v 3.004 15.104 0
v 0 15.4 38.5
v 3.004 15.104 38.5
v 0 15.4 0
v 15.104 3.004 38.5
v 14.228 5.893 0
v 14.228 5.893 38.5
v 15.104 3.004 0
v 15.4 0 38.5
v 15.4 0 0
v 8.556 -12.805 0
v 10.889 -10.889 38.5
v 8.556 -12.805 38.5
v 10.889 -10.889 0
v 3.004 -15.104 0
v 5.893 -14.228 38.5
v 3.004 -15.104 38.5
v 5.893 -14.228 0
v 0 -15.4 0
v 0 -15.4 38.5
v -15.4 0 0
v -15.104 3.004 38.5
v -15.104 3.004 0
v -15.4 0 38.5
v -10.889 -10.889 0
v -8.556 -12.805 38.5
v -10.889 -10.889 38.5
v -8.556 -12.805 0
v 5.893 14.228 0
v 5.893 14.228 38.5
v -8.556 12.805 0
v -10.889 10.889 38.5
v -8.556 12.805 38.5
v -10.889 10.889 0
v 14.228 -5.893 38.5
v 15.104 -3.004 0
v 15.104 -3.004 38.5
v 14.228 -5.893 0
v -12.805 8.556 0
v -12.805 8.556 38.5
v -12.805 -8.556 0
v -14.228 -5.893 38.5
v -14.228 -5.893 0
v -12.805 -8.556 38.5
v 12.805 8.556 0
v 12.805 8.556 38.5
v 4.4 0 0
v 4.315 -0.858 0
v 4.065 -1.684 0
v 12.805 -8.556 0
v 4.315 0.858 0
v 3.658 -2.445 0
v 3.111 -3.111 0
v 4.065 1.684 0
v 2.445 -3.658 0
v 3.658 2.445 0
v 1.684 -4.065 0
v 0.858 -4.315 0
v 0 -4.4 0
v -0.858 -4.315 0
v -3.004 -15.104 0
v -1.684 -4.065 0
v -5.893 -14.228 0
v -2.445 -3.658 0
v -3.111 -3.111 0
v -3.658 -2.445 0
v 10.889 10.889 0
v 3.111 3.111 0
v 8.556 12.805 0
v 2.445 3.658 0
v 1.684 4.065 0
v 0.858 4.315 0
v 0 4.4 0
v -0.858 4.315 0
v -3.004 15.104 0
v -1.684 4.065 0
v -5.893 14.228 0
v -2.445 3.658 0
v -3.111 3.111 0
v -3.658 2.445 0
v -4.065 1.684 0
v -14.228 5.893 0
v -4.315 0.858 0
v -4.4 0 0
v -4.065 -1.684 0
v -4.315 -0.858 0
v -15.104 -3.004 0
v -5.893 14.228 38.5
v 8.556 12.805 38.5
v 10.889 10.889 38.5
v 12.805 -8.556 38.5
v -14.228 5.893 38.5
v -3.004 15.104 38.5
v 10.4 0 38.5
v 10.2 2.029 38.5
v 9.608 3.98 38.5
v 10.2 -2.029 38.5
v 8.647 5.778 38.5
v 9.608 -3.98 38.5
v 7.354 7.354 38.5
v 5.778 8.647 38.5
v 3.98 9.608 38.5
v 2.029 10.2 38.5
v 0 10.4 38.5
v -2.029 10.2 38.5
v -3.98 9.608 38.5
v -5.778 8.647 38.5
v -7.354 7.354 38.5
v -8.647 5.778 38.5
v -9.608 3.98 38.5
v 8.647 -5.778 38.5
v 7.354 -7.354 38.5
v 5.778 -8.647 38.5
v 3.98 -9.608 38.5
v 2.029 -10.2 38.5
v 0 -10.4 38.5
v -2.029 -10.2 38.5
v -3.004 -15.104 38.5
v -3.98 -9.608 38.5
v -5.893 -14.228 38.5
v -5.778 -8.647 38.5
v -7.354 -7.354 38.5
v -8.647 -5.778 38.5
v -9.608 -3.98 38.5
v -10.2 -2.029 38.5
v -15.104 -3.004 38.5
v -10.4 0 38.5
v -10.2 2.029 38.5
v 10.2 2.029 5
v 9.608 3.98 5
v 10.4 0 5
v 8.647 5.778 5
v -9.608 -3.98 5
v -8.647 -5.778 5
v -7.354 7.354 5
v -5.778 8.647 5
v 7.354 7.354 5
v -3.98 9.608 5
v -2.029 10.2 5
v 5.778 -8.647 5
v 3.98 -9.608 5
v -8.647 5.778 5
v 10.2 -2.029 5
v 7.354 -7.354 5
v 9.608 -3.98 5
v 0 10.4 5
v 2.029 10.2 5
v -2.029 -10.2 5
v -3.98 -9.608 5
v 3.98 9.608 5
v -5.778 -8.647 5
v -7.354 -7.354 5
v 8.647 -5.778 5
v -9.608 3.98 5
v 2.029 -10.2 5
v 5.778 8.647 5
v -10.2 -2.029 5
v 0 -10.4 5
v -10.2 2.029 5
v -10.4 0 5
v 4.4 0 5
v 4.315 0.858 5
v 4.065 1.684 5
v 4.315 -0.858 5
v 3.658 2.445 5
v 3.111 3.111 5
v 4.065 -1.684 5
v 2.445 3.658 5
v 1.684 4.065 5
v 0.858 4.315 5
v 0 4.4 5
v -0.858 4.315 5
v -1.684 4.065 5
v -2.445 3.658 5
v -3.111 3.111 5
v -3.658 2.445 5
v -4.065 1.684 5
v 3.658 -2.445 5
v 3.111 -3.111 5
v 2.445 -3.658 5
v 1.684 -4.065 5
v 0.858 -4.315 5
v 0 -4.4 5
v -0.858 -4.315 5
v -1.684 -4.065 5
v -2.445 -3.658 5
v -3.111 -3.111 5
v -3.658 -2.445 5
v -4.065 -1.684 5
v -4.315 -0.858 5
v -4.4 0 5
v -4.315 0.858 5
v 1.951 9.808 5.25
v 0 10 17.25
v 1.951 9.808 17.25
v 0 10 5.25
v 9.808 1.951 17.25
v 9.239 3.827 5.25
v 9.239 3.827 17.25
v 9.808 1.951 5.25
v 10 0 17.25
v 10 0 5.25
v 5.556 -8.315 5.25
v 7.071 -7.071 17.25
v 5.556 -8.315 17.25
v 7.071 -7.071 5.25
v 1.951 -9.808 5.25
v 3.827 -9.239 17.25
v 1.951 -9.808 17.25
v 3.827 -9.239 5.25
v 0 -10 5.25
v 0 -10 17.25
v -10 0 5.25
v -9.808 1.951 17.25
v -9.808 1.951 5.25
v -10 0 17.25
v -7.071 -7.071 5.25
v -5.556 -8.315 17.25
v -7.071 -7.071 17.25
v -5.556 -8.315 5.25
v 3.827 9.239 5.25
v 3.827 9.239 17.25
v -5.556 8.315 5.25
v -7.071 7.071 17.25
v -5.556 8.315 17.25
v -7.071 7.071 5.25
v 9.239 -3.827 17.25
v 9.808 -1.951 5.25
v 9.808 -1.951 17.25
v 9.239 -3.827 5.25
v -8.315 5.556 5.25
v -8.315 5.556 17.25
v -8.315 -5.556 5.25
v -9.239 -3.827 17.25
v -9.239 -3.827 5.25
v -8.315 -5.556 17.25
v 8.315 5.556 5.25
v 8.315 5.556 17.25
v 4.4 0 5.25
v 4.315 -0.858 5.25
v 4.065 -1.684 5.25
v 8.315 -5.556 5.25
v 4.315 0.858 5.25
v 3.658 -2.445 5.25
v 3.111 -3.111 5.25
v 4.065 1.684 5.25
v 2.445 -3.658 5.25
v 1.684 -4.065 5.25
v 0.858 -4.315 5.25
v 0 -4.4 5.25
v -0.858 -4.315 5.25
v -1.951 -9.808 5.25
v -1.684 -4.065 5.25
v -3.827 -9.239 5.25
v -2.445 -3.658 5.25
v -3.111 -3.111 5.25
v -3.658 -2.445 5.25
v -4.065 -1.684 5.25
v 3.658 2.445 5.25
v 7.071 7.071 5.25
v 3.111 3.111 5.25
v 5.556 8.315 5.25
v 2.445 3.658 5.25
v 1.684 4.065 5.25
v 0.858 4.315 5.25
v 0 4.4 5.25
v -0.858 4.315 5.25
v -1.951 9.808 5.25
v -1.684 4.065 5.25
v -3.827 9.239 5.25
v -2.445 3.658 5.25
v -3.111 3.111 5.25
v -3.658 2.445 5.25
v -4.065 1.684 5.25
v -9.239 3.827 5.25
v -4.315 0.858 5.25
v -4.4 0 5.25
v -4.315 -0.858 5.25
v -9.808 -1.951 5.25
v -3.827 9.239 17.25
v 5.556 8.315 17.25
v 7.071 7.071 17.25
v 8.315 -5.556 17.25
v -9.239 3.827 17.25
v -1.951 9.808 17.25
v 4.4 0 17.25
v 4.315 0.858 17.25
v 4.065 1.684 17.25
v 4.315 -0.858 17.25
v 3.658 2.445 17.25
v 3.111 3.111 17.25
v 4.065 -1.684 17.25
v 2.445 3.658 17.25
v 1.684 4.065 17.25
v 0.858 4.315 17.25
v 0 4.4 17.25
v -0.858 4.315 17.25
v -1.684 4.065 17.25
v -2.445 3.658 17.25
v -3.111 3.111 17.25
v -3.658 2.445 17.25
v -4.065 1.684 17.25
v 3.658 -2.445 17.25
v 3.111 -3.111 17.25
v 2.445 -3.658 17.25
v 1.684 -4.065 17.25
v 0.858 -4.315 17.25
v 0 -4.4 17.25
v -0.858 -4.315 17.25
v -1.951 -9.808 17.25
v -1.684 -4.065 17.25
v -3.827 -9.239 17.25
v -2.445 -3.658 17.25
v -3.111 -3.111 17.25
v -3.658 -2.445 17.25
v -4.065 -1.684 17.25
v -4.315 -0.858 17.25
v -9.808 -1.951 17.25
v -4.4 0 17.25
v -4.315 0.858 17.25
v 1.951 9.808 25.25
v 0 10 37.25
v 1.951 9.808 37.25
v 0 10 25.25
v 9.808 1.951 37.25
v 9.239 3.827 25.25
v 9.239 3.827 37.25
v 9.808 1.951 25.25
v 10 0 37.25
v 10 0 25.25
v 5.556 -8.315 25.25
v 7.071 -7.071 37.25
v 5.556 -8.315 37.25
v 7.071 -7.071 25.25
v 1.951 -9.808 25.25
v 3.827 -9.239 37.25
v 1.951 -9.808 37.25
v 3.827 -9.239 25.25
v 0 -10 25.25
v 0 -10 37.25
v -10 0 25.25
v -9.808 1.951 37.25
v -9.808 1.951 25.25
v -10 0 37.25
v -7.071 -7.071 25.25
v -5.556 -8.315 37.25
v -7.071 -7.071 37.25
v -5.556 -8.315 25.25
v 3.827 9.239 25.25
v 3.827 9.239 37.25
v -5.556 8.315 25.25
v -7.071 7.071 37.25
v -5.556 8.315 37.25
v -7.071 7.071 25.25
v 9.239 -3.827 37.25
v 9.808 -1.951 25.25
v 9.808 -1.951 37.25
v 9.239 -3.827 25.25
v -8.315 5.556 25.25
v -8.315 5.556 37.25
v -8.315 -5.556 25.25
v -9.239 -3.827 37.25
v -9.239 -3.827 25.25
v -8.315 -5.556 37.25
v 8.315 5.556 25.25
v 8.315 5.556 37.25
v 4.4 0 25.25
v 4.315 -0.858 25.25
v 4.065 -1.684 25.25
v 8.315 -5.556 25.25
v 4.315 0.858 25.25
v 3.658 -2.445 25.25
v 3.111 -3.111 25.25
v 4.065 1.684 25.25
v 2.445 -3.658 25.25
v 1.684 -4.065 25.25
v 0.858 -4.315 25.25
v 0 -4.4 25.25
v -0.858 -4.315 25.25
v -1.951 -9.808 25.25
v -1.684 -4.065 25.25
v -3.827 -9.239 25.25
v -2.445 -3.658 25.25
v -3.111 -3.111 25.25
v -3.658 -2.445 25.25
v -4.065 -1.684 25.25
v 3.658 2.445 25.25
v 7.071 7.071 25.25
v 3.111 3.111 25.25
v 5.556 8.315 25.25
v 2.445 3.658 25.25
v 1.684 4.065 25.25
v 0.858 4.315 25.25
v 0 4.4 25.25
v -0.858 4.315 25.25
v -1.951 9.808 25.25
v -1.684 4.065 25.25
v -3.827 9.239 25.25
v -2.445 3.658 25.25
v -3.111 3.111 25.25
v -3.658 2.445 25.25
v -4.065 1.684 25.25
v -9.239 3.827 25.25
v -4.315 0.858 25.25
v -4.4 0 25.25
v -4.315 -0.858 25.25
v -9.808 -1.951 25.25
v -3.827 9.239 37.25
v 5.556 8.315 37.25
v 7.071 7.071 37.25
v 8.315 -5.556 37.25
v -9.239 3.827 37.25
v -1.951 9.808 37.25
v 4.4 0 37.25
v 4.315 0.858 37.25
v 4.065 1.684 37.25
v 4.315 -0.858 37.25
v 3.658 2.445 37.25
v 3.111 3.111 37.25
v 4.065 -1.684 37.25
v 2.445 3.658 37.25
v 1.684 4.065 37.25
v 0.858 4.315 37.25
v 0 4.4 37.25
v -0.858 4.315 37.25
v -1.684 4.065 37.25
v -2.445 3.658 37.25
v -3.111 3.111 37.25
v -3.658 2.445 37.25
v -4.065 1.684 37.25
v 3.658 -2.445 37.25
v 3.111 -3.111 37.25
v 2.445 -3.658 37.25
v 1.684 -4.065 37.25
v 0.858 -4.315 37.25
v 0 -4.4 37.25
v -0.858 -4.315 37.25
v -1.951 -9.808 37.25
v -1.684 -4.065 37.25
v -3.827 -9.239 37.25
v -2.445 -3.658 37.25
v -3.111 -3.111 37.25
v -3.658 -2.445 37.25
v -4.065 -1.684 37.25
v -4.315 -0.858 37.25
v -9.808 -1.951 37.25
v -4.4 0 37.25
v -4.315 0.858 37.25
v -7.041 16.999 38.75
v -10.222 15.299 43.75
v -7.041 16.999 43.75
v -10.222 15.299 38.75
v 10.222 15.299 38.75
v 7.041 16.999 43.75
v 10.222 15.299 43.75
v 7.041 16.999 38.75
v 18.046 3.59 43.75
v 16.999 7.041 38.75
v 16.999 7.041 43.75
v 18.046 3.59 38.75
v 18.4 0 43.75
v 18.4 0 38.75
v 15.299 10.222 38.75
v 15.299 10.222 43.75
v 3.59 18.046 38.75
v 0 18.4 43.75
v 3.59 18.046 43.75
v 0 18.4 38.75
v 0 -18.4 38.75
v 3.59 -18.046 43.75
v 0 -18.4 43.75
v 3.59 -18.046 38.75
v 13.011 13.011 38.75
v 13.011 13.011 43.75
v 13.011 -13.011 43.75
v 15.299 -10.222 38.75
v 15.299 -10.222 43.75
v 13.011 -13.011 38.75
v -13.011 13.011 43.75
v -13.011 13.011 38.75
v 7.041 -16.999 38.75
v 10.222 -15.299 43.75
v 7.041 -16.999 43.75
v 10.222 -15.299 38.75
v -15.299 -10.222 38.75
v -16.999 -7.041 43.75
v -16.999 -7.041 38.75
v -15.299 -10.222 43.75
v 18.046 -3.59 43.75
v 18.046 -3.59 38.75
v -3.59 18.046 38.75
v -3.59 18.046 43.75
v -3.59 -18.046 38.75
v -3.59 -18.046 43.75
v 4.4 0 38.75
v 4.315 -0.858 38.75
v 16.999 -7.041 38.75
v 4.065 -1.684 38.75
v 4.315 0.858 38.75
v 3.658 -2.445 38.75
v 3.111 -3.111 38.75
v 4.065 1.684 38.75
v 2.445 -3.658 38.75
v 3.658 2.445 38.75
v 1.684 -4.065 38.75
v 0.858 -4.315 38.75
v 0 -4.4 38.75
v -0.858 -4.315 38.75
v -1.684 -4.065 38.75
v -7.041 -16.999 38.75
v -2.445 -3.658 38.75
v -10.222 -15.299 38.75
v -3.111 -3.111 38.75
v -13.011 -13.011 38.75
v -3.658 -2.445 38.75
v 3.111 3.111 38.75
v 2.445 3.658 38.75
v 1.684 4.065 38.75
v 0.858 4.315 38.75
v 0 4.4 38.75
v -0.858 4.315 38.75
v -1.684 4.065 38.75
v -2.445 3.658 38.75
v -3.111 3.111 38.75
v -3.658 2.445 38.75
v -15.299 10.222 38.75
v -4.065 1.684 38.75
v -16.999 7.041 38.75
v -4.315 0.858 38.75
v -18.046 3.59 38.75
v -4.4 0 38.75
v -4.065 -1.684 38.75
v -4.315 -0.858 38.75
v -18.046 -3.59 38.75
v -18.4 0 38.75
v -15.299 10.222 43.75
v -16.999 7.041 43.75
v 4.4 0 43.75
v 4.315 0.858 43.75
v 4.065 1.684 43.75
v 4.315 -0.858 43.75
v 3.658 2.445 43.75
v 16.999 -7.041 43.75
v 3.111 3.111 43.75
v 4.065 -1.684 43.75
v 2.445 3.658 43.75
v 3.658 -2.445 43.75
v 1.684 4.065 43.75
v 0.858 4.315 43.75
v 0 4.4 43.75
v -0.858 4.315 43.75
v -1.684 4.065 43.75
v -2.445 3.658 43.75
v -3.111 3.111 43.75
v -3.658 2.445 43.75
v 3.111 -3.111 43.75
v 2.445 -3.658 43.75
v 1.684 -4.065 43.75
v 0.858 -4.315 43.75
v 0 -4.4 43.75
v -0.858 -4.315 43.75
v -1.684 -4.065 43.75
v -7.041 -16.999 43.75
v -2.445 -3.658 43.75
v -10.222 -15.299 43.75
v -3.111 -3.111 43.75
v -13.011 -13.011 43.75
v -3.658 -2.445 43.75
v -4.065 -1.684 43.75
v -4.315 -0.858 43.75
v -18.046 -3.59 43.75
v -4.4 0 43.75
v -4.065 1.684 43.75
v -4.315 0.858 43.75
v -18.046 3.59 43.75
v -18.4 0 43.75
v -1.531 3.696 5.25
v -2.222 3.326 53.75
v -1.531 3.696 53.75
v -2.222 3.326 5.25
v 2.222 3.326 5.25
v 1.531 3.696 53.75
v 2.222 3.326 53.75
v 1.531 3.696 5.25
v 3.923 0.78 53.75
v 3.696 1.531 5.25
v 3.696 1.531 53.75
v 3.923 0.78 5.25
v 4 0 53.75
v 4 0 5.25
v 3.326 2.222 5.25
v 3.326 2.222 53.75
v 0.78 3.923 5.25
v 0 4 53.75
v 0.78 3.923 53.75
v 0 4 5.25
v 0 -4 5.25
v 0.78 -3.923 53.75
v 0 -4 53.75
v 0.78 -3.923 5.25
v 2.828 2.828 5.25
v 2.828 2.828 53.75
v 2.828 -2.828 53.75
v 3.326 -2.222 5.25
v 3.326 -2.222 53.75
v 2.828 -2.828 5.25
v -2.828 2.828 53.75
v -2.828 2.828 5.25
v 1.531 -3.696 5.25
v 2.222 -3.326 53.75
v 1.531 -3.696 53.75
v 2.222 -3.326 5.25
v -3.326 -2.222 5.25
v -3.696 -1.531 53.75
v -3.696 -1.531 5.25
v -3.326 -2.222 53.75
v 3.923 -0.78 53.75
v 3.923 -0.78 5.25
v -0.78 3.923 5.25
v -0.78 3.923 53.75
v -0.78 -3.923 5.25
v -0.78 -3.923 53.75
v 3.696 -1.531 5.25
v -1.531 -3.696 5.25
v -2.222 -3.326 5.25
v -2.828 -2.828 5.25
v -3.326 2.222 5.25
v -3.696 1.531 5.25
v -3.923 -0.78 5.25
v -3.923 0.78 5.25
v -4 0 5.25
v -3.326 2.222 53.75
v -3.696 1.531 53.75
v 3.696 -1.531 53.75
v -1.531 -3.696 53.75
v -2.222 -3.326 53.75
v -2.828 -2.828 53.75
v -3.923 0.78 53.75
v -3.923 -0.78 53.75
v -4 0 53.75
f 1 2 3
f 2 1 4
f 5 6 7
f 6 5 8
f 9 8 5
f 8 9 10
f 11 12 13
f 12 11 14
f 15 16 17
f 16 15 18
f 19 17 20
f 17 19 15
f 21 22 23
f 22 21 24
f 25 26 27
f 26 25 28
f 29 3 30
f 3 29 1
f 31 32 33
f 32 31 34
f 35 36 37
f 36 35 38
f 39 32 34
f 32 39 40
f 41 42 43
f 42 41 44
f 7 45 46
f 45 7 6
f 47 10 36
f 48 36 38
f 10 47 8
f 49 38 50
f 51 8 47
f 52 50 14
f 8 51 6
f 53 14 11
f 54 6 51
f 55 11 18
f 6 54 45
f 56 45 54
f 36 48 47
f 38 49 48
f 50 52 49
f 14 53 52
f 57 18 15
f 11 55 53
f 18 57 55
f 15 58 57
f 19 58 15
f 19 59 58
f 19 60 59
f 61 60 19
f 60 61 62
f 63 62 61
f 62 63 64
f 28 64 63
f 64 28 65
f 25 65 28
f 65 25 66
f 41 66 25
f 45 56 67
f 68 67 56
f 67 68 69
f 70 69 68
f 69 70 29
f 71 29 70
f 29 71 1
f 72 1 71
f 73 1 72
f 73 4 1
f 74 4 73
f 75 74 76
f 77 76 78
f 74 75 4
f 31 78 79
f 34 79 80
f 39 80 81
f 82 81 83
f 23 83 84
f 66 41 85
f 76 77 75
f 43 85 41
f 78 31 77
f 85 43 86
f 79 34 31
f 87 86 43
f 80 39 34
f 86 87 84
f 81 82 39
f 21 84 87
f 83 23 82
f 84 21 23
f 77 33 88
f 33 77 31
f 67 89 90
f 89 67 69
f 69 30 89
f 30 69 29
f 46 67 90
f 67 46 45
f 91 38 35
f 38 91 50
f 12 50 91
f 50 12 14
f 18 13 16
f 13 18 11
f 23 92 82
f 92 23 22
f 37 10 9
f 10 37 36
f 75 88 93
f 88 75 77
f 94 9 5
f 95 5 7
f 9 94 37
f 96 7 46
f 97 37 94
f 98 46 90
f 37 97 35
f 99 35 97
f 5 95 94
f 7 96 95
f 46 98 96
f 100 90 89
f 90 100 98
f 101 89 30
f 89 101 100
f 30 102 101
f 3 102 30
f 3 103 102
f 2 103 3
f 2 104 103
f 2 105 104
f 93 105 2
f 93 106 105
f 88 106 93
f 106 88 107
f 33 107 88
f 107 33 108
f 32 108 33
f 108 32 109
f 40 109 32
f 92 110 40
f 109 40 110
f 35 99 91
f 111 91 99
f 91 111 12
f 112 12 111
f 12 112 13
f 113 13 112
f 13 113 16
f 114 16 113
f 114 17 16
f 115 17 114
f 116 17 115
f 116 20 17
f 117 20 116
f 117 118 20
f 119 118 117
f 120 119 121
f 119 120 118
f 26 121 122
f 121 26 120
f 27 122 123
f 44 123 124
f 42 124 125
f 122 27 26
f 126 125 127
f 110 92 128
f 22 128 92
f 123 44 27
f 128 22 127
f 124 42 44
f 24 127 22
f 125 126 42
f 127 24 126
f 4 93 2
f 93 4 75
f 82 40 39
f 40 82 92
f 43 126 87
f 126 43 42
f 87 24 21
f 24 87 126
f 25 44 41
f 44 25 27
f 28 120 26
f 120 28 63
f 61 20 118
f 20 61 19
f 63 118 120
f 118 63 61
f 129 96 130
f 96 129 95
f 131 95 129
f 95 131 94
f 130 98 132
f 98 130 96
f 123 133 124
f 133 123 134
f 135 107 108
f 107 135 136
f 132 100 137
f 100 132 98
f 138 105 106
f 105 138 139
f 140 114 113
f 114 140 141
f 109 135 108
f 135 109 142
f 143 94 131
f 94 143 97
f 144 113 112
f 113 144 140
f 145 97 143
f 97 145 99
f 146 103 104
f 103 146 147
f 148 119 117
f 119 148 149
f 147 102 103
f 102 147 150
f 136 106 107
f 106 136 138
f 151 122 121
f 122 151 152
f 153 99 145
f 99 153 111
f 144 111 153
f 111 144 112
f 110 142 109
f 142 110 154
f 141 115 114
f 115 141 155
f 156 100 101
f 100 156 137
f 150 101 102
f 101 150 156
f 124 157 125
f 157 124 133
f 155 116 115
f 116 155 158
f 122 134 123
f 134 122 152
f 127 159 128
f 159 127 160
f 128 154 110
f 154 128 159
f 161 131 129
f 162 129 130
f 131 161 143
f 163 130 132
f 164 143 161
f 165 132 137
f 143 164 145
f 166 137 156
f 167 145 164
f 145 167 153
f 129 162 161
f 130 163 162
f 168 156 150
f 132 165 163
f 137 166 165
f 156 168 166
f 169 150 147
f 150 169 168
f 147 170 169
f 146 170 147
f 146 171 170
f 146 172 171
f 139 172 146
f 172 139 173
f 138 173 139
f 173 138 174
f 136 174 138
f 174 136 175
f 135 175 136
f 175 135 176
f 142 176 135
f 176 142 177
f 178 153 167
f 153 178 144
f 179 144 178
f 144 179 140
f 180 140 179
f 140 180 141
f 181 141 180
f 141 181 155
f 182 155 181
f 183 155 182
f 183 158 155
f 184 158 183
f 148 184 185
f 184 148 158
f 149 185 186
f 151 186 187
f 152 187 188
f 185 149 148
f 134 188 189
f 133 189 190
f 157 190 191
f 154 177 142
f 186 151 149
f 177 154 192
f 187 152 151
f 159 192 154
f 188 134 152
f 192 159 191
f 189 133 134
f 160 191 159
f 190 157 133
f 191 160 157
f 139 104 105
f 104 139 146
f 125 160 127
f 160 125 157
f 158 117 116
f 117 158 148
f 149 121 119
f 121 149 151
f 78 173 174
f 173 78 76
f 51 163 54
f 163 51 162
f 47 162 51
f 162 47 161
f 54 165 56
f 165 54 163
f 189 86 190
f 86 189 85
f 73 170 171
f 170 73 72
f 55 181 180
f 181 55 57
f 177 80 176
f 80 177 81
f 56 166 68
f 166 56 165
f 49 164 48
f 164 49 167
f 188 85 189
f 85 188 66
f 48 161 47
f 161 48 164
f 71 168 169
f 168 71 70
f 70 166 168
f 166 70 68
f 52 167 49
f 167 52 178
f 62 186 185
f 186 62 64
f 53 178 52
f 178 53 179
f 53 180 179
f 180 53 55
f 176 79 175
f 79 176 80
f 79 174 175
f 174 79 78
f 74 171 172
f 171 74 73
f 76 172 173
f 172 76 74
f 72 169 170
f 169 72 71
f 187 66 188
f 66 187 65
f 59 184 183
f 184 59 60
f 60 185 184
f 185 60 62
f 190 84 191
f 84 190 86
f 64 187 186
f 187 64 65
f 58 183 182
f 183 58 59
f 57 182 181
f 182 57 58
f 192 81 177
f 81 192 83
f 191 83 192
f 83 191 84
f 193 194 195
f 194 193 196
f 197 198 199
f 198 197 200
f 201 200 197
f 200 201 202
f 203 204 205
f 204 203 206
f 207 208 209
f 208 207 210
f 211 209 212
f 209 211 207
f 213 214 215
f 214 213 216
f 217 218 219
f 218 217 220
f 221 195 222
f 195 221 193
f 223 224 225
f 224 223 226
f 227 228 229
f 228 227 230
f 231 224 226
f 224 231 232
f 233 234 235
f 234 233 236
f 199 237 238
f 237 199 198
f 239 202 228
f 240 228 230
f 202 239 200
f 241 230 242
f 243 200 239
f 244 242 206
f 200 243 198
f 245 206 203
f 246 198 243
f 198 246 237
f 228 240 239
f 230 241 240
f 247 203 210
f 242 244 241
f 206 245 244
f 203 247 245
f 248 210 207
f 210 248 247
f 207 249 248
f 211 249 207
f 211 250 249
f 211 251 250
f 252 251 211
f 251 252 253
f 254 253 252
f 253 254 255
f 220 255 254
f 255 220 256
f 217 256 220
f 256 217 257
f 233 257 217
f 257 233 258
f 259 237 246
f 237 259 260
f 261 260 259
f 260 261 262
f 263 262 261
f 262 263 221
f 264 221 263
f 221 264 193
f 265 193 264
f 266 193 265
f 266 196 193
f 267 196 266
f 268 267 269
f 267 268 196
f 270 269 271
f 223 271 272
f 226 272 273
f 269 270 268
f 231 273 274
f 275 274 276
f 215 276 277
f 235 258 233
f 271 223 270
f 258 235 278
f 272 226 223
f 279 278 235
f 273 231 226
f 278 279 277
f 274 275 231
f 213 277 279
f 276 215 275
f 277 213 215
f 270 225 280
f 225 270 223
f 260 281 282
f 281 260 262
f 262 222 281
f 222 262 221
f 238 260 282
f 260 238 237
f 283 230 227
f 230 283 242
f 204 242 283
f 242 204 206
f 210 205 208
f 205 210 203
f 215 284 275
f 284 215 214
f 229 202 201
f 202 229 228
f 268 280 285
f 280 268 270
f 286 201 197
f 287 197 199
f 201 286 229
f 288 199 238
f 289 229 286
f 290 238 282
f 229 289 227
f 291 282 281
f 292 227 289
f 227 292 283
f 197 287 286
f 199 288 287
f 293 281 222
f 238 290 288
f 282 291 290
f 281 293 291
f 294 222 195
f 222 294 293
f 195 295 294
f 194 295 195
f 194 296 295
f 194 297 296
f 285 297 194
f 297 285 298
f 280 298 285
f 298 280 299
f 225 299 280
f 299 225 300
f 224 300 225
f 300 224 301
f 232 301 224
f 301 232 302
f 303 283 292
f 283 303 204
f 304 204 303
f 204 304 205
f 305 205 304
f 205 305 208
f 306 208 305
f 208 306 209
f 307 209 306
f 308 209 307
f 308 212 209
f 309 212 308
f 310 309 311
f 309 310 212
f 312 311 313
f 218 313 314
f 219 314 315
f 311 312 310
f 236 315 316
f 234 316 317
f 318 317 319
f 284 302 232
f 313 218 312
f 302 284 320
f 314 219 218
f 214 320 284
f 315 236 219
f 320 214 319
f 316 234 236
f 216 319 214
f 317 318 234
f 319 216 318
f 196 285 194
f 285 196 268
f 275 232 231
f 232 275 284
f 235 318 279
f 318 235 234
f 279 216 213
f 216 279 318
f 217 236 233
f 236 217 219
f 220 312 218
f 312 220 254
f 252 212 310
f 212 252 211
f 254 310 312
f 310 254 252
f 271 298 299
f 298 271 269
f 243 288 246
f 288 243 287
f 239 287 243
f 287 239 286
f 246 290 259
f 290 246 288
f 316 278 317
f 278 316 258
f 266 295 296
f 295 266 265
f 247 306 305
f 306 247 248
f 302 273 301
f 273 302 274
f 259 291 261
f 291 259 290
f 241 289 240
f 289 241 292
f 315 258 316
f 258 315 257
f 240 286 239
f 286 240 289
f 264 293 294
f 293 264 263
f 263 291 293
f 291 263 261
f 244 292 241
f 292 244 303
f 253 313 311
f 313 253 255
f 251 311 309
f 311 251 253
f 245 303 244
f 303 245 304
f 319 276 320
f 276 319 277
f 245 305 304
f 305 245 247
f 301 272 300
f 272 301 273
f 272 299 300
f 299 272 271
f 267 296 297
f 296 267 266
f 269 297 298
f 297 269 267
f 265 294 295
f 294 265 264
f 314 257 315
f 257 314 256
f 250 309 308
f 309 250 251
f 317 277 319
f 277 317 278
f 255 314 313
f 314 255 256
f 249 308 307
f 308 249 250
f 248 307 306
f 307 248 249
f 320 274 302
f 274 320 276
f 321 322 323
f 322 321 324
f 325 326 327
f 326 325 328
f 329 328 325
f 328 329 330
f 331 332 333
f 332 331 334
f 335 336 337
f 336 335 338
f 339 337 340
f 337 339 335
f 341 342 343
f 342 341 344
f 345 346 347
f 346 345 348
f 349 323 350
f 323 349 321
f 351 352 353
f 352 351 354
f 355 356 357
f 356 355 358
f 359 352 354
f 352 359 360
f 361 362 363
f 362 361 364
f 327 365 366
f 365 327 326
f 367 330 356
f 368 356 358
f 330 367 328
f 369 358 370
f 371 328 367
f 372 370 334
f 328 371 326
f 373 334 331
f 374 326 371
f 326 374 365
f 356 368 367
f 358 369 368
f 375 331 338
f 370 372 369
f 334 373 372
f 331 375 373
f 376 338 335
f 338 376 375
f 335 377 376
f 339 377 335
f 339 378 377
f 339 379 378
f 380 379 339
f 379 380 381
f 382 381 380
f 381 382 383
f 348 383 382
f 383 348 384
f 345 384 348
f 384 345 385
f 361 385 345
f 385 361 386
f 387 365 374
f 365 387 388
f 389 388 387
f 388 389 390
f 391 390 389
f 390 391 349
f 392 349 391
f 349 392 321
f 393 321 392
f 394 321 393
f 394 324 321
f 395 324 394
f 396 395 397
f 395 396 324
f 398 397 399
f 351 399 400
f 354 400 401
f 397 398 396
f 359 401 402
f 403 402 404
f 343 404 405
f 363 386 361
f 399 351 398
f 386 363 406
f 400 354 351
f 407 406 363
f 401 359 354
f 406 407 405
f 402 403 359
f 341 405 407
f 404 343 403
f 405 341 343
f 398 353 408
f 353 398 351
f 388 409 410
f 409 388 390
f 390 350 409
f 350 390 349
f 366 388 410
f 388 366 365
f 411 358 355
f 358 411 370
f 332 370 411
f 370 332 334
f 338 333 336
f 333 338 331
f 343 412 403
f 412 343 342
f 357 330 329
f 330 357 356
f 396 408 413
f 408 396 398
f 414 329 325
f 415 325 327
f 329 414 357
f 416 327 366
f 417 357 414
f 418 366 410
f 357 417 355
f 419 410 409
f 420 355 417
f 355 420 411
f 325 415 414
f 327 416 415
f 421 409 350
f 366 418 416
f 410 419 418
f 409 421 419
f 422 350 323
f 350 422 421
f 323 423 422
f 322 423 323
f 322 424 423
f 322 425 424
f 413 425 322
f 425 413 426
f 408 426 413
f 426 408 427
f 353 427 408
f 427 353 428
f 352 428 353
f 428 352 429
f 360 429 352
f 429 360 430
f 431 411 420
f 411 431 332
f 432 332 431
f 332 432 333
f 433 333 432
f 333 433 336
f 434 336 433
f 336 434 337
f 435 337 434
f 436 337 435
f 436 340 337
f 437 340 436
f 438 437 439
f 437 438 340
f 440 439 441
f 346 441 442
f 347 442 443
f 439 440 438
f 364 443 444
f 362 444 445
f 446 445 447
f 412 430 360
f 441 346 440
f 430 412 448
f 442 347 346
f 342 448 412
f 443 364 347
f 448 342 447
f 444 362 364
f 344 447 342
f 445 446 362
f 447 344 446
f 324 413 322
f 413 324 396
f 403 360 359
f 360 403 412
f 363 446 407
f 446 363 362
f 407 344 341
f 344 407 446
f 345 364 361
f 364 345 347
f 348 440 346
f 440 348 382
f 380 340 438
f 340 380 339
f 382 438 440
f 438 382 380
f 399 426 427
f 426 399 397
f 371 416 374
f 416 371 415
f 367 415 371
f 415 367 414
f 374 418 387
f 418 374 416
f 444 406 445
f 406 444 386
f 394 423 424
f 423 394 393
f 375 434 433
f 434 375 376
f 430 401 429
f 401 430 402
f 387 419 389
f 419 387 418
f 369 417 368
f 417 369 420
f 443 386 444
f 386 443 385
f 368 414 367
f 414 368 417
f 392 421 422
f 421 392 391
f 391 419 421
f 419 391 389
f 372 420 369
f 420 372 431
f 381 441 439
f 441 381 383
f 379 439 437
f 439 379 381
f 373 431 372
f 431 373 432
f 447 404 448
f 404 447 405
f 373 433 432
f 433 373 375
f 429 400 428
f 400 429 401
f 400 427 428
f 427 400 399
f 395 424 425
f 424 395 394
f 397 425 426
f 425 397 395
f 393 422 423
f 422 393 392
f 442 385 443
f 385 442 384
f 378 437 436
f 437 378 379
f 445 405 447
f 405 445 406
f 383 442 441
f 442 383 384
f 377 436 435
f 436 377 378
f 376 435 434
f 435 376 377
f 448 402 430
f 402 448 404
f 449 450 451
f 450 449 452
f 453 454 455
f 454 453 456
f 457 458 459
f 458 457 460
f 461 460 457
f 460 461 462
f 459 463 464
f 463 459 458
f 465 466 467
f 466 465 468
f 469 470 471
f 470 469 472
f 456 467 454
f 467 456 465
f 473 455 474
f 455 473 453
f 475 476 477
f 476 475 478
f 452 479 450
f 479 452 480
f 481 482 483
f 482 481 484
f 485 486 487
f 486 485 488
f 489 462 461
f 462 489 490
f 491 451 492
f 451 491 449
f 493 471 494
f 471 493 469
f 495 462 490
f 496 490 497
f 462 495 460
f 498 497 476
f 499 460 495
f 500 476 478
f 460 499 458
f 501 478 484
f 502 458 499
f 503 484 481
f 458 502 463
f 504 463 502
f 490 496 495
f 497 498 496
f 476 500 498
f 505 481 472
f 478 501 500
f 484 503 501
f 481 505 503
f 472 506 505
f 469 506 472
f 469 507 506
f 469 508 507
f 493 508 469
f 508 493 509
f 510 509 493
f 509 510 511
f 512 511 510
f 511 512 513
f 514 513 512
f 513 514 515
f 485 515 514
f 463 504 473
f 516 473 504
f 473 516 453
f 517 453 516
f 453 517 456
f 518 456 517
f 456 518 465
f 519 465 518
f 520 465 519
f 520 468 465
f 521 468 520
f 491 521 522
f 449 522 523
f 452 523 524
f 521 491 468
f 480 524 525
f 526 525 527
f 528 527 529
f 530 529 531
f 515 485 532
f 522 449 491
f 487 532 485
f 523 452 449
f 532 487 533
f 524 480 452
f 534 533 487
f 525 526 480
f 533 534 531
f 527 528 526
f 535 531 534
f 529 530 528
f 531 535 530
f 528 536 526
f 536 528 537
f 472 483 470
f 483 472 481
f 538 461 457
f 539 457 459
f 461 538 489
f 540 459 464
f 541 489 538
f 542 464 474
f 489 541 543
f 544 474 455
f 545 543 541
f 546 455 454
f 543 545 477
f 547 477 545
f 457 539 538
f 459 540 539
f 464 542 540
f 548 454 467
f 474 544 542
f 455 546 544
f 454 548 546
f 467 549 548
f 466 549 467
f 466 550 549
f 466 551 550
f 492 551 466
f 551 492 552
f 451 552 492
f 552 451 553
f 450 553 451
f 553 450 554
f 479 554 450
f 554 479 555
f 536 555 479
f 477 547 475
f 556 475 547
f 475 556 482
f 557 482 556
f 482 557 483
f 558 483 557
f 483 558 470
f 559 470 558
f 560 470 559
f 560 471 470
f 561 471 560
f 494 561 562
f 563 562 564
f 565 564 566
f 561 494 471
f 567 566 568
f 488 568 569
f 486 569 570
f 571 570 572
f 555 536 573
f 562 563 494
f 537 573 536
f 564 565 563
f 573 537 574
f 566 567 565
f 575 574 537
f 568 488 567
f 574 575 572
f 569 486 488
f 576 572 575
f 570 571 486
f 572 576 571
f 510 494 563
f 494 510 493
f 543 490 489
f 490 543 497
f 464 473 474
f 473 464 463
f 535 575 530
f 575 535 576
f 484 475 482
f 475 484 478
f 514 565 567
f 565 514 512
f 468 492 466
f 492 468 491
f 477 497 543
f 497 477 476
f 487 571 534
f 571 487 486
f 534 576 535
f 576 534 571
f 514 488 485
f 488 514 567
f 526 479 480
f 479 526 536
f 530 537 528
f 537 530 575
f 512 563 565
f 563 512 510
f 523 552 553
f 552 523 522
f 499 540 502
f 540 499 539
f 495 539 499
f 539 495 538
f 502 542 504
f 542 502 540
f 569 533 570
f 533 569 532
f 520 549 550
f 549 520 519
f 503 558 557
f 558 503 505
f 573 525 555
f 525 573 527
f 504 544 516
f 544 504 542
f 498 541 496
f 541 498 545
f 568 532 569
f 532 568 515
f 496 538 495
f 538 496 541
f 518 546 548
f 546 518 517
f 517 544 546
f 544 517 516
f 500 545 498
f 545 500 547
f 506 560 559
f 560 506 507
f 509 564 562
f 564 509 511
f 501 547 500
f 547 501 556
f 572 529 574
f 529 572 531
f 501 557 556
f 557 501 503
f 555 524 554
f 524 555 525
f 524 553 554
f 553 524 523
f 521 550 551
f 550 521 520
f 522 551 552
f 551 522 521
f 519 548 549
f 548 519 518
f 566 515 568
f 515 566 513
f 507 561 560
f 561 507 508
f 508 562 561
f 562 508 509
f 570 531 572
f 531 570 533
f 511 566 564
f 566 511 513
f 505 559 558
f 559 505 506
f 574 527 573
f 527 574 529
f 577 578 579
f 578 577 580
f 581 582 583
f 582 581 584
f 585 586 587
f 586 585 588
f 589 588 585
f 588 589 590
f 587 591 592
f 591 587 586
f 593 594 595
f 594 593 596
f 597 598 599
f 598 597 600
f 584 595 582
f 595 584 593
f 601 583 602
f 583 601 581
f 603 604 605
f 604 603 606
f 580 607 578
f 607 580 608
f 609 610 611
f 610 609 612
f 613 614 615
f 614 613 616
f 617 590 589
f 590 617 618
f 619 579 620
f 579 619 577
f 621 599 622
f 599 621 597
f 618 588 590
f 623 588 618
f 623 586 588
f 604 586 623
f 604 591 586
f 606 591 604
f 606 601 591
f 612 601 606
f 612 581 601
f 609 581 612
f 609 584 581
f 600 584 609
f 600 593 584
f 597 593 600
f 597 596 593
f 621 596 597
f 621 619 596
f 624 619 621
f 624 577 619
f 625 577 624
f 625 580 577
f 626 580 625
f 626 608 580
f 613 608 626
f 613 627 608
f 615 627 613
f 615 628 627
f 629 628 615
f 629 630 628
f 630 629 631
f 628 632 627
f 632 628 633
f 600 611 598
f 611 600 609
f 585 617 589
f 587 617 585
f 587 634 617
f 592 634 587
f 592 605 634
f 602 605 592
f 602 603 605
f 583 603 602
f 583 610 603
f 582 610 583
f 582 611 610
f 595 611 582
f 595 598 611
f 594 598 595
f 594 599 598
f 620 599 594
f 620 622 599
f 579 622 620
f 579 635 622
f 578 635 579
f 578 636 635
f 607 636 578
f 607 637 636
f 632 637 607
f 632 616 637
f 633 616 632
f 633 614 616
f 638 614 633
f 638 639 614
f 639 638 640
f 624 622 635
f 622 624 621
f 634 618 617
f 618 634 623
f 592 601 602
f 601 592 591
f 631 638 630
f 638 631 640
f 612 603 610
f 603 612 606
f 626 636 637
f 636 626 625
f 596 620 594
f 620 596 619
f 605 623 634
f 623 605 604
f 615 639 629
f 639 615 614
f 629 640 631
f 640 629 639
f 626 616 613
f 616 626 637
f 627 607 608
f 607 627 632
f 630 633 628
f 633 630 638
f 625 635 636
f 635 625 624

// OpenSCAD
$fn = 32;

// ------------------------------------------------------------------------
// Shaft station: cup d30.8 x 38.5 mm, shaft d8
// Every part is its own module, assembly() places every instance.
// ------------------------------------------------------------------------

// --- part 1 ---
module housing_cup() {
  difference() {
    cylinder(h = 38.5, d = 30.8);
    translate([0, 0, 5]) cylinder(h = 34.5, d = 20.8);
    translate([0, 0, -1]) cylinder(h = 7, d = 8.8);
  }
}

// --- part 2 ---
module bearing_lower() {
  difference() {
      translate([0, 0, 0]) cylinder(h = 12, d = 20);
      translate([0, 0, -1]) cylinder(h = 14, d = 8.8);
    }
}

// --- part 3 ---
module bearing_upper() {
  difference() {
      translate([0, 0, 0]) cylinder(h = 12, d = 20);
      translate([0, 0, -1]) cylinder(h = 14, d = 8.8);
    }
}

// --- part 4 ---
module station_shaft() {
  translate([0, 0, -24.25]) cylinder(h = 48.5, d = 8);
}

// --- part 5 ---
module station_cover() {
  difference() {
    cylinder(h = 5, d = 36.8);
    translate([0, 0, -1]) cylinder(h = 7, d = 8.8);
  }
}

// --- assembly ---
module assembly() {
  color([0.80, 0.24, 0.20]) translate([0, 0, 0]) rotate([0, 0, 0]) housing_cup();
  color([0.20, 0.45, 0.75]) translate([0, 0, 5.25]) rotate([0, 0, 0]) bearing_lower();
  color([0.25, 0.62, 0.32]) translate([0, 0, 25.25]) rotate([0, 0, 0]) bearing_upper();
  color([0.92, 0.70, 0.18]) translate([0, 0, 29.5]) rotate([0, 0, 0]) station_shaft();
  color([0.58, 0.35, 0.70]) translate([0, 0, 38.75]) rotate([0, 0, 0]) station_cover();
}

assembly();
